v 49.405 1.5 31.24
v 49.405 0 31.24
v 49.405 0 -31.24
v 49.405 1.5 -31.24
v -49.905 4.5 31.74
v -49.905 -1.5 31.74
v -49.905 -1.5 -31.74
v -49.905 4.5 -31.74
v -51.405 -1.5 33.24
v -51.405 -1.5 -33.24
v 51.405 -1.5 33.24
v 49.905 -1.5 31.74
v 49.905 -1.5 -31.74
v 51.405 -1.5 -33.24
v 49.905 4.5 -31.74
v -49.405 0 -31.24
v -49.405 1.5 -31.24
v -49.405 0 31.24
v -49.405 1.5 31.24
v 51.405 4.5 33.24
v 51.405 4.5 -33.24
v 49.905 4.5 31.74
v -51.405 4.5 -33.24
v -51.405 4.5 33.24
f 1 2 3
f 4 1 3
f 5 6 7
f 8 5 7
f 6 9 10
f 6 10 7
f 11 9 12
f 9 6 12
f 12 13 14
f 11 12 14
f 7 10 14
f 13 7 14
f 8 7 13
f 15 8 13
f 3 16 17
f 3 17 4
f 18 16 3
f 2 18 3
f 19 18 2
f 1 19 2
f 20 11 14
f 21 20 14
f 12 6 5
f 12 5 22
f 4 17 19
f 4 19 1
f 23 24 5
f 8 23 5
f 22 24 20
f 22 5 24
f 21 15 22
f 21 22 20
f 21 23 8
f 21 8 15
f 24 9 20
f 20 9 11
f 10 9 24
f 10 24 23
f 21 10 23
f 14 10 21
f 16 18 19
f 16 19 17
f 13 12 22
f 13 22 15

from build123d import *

# Parameters (mm, degrees)
SKETCH1_W                = 98.81
SKETCH1_H                = 62.48
BOSS_EXTRUDE1_DEPTH      = 1.5
BOSS_EXTRUDE2_DEPTH      = 3
BOSS_EXTRUDE2_DEPTH_BACK = 3
SKETCH2_W                = 102.81
SKETCH2_H                = 66.48
SKETCH2_W_2              = 99.81
SKETCH2_H_2              = 63.48


with BuildPart() as part:
    # Sketch1 → Boss-Extrude1 (new body)
    with BuildSketch(Plane(origin=(0, 0, 0), x_dir=(1, 0, 0), z_dir=(0, 1, 0))):
        Rectangle(SKETCH1_W, SKETCH1_H)
    extrude(amount=BOSS_EXTRUDE1_DEPTH)


with BuildPart() as body_2:
    # Sketch2 → Boss-Extrude2 (new, two sides: drawn at the far end of the back side and taken through both)
    with BuildSketch(Plane(origin=(0, 1.5, 0), x_dir=(1, 0, 0), z_dir=(0, 1, 0)).offset(-BOSS_EXTRUDE2_DEPTH_BACK)):
        Rectangle(SKETCH2_W, SKETCH2_H)
        Rectangle(SKETCH2_W_2, SKETCH2_H_2, mode=Mode.SUBTRACT)
    extrude(amount=BOSS_EXTRUDE2_DEPTH + BOSS_EXTRUDE2_DEPTH_BACK)


solid = Compound([part.part, body_2.part])
